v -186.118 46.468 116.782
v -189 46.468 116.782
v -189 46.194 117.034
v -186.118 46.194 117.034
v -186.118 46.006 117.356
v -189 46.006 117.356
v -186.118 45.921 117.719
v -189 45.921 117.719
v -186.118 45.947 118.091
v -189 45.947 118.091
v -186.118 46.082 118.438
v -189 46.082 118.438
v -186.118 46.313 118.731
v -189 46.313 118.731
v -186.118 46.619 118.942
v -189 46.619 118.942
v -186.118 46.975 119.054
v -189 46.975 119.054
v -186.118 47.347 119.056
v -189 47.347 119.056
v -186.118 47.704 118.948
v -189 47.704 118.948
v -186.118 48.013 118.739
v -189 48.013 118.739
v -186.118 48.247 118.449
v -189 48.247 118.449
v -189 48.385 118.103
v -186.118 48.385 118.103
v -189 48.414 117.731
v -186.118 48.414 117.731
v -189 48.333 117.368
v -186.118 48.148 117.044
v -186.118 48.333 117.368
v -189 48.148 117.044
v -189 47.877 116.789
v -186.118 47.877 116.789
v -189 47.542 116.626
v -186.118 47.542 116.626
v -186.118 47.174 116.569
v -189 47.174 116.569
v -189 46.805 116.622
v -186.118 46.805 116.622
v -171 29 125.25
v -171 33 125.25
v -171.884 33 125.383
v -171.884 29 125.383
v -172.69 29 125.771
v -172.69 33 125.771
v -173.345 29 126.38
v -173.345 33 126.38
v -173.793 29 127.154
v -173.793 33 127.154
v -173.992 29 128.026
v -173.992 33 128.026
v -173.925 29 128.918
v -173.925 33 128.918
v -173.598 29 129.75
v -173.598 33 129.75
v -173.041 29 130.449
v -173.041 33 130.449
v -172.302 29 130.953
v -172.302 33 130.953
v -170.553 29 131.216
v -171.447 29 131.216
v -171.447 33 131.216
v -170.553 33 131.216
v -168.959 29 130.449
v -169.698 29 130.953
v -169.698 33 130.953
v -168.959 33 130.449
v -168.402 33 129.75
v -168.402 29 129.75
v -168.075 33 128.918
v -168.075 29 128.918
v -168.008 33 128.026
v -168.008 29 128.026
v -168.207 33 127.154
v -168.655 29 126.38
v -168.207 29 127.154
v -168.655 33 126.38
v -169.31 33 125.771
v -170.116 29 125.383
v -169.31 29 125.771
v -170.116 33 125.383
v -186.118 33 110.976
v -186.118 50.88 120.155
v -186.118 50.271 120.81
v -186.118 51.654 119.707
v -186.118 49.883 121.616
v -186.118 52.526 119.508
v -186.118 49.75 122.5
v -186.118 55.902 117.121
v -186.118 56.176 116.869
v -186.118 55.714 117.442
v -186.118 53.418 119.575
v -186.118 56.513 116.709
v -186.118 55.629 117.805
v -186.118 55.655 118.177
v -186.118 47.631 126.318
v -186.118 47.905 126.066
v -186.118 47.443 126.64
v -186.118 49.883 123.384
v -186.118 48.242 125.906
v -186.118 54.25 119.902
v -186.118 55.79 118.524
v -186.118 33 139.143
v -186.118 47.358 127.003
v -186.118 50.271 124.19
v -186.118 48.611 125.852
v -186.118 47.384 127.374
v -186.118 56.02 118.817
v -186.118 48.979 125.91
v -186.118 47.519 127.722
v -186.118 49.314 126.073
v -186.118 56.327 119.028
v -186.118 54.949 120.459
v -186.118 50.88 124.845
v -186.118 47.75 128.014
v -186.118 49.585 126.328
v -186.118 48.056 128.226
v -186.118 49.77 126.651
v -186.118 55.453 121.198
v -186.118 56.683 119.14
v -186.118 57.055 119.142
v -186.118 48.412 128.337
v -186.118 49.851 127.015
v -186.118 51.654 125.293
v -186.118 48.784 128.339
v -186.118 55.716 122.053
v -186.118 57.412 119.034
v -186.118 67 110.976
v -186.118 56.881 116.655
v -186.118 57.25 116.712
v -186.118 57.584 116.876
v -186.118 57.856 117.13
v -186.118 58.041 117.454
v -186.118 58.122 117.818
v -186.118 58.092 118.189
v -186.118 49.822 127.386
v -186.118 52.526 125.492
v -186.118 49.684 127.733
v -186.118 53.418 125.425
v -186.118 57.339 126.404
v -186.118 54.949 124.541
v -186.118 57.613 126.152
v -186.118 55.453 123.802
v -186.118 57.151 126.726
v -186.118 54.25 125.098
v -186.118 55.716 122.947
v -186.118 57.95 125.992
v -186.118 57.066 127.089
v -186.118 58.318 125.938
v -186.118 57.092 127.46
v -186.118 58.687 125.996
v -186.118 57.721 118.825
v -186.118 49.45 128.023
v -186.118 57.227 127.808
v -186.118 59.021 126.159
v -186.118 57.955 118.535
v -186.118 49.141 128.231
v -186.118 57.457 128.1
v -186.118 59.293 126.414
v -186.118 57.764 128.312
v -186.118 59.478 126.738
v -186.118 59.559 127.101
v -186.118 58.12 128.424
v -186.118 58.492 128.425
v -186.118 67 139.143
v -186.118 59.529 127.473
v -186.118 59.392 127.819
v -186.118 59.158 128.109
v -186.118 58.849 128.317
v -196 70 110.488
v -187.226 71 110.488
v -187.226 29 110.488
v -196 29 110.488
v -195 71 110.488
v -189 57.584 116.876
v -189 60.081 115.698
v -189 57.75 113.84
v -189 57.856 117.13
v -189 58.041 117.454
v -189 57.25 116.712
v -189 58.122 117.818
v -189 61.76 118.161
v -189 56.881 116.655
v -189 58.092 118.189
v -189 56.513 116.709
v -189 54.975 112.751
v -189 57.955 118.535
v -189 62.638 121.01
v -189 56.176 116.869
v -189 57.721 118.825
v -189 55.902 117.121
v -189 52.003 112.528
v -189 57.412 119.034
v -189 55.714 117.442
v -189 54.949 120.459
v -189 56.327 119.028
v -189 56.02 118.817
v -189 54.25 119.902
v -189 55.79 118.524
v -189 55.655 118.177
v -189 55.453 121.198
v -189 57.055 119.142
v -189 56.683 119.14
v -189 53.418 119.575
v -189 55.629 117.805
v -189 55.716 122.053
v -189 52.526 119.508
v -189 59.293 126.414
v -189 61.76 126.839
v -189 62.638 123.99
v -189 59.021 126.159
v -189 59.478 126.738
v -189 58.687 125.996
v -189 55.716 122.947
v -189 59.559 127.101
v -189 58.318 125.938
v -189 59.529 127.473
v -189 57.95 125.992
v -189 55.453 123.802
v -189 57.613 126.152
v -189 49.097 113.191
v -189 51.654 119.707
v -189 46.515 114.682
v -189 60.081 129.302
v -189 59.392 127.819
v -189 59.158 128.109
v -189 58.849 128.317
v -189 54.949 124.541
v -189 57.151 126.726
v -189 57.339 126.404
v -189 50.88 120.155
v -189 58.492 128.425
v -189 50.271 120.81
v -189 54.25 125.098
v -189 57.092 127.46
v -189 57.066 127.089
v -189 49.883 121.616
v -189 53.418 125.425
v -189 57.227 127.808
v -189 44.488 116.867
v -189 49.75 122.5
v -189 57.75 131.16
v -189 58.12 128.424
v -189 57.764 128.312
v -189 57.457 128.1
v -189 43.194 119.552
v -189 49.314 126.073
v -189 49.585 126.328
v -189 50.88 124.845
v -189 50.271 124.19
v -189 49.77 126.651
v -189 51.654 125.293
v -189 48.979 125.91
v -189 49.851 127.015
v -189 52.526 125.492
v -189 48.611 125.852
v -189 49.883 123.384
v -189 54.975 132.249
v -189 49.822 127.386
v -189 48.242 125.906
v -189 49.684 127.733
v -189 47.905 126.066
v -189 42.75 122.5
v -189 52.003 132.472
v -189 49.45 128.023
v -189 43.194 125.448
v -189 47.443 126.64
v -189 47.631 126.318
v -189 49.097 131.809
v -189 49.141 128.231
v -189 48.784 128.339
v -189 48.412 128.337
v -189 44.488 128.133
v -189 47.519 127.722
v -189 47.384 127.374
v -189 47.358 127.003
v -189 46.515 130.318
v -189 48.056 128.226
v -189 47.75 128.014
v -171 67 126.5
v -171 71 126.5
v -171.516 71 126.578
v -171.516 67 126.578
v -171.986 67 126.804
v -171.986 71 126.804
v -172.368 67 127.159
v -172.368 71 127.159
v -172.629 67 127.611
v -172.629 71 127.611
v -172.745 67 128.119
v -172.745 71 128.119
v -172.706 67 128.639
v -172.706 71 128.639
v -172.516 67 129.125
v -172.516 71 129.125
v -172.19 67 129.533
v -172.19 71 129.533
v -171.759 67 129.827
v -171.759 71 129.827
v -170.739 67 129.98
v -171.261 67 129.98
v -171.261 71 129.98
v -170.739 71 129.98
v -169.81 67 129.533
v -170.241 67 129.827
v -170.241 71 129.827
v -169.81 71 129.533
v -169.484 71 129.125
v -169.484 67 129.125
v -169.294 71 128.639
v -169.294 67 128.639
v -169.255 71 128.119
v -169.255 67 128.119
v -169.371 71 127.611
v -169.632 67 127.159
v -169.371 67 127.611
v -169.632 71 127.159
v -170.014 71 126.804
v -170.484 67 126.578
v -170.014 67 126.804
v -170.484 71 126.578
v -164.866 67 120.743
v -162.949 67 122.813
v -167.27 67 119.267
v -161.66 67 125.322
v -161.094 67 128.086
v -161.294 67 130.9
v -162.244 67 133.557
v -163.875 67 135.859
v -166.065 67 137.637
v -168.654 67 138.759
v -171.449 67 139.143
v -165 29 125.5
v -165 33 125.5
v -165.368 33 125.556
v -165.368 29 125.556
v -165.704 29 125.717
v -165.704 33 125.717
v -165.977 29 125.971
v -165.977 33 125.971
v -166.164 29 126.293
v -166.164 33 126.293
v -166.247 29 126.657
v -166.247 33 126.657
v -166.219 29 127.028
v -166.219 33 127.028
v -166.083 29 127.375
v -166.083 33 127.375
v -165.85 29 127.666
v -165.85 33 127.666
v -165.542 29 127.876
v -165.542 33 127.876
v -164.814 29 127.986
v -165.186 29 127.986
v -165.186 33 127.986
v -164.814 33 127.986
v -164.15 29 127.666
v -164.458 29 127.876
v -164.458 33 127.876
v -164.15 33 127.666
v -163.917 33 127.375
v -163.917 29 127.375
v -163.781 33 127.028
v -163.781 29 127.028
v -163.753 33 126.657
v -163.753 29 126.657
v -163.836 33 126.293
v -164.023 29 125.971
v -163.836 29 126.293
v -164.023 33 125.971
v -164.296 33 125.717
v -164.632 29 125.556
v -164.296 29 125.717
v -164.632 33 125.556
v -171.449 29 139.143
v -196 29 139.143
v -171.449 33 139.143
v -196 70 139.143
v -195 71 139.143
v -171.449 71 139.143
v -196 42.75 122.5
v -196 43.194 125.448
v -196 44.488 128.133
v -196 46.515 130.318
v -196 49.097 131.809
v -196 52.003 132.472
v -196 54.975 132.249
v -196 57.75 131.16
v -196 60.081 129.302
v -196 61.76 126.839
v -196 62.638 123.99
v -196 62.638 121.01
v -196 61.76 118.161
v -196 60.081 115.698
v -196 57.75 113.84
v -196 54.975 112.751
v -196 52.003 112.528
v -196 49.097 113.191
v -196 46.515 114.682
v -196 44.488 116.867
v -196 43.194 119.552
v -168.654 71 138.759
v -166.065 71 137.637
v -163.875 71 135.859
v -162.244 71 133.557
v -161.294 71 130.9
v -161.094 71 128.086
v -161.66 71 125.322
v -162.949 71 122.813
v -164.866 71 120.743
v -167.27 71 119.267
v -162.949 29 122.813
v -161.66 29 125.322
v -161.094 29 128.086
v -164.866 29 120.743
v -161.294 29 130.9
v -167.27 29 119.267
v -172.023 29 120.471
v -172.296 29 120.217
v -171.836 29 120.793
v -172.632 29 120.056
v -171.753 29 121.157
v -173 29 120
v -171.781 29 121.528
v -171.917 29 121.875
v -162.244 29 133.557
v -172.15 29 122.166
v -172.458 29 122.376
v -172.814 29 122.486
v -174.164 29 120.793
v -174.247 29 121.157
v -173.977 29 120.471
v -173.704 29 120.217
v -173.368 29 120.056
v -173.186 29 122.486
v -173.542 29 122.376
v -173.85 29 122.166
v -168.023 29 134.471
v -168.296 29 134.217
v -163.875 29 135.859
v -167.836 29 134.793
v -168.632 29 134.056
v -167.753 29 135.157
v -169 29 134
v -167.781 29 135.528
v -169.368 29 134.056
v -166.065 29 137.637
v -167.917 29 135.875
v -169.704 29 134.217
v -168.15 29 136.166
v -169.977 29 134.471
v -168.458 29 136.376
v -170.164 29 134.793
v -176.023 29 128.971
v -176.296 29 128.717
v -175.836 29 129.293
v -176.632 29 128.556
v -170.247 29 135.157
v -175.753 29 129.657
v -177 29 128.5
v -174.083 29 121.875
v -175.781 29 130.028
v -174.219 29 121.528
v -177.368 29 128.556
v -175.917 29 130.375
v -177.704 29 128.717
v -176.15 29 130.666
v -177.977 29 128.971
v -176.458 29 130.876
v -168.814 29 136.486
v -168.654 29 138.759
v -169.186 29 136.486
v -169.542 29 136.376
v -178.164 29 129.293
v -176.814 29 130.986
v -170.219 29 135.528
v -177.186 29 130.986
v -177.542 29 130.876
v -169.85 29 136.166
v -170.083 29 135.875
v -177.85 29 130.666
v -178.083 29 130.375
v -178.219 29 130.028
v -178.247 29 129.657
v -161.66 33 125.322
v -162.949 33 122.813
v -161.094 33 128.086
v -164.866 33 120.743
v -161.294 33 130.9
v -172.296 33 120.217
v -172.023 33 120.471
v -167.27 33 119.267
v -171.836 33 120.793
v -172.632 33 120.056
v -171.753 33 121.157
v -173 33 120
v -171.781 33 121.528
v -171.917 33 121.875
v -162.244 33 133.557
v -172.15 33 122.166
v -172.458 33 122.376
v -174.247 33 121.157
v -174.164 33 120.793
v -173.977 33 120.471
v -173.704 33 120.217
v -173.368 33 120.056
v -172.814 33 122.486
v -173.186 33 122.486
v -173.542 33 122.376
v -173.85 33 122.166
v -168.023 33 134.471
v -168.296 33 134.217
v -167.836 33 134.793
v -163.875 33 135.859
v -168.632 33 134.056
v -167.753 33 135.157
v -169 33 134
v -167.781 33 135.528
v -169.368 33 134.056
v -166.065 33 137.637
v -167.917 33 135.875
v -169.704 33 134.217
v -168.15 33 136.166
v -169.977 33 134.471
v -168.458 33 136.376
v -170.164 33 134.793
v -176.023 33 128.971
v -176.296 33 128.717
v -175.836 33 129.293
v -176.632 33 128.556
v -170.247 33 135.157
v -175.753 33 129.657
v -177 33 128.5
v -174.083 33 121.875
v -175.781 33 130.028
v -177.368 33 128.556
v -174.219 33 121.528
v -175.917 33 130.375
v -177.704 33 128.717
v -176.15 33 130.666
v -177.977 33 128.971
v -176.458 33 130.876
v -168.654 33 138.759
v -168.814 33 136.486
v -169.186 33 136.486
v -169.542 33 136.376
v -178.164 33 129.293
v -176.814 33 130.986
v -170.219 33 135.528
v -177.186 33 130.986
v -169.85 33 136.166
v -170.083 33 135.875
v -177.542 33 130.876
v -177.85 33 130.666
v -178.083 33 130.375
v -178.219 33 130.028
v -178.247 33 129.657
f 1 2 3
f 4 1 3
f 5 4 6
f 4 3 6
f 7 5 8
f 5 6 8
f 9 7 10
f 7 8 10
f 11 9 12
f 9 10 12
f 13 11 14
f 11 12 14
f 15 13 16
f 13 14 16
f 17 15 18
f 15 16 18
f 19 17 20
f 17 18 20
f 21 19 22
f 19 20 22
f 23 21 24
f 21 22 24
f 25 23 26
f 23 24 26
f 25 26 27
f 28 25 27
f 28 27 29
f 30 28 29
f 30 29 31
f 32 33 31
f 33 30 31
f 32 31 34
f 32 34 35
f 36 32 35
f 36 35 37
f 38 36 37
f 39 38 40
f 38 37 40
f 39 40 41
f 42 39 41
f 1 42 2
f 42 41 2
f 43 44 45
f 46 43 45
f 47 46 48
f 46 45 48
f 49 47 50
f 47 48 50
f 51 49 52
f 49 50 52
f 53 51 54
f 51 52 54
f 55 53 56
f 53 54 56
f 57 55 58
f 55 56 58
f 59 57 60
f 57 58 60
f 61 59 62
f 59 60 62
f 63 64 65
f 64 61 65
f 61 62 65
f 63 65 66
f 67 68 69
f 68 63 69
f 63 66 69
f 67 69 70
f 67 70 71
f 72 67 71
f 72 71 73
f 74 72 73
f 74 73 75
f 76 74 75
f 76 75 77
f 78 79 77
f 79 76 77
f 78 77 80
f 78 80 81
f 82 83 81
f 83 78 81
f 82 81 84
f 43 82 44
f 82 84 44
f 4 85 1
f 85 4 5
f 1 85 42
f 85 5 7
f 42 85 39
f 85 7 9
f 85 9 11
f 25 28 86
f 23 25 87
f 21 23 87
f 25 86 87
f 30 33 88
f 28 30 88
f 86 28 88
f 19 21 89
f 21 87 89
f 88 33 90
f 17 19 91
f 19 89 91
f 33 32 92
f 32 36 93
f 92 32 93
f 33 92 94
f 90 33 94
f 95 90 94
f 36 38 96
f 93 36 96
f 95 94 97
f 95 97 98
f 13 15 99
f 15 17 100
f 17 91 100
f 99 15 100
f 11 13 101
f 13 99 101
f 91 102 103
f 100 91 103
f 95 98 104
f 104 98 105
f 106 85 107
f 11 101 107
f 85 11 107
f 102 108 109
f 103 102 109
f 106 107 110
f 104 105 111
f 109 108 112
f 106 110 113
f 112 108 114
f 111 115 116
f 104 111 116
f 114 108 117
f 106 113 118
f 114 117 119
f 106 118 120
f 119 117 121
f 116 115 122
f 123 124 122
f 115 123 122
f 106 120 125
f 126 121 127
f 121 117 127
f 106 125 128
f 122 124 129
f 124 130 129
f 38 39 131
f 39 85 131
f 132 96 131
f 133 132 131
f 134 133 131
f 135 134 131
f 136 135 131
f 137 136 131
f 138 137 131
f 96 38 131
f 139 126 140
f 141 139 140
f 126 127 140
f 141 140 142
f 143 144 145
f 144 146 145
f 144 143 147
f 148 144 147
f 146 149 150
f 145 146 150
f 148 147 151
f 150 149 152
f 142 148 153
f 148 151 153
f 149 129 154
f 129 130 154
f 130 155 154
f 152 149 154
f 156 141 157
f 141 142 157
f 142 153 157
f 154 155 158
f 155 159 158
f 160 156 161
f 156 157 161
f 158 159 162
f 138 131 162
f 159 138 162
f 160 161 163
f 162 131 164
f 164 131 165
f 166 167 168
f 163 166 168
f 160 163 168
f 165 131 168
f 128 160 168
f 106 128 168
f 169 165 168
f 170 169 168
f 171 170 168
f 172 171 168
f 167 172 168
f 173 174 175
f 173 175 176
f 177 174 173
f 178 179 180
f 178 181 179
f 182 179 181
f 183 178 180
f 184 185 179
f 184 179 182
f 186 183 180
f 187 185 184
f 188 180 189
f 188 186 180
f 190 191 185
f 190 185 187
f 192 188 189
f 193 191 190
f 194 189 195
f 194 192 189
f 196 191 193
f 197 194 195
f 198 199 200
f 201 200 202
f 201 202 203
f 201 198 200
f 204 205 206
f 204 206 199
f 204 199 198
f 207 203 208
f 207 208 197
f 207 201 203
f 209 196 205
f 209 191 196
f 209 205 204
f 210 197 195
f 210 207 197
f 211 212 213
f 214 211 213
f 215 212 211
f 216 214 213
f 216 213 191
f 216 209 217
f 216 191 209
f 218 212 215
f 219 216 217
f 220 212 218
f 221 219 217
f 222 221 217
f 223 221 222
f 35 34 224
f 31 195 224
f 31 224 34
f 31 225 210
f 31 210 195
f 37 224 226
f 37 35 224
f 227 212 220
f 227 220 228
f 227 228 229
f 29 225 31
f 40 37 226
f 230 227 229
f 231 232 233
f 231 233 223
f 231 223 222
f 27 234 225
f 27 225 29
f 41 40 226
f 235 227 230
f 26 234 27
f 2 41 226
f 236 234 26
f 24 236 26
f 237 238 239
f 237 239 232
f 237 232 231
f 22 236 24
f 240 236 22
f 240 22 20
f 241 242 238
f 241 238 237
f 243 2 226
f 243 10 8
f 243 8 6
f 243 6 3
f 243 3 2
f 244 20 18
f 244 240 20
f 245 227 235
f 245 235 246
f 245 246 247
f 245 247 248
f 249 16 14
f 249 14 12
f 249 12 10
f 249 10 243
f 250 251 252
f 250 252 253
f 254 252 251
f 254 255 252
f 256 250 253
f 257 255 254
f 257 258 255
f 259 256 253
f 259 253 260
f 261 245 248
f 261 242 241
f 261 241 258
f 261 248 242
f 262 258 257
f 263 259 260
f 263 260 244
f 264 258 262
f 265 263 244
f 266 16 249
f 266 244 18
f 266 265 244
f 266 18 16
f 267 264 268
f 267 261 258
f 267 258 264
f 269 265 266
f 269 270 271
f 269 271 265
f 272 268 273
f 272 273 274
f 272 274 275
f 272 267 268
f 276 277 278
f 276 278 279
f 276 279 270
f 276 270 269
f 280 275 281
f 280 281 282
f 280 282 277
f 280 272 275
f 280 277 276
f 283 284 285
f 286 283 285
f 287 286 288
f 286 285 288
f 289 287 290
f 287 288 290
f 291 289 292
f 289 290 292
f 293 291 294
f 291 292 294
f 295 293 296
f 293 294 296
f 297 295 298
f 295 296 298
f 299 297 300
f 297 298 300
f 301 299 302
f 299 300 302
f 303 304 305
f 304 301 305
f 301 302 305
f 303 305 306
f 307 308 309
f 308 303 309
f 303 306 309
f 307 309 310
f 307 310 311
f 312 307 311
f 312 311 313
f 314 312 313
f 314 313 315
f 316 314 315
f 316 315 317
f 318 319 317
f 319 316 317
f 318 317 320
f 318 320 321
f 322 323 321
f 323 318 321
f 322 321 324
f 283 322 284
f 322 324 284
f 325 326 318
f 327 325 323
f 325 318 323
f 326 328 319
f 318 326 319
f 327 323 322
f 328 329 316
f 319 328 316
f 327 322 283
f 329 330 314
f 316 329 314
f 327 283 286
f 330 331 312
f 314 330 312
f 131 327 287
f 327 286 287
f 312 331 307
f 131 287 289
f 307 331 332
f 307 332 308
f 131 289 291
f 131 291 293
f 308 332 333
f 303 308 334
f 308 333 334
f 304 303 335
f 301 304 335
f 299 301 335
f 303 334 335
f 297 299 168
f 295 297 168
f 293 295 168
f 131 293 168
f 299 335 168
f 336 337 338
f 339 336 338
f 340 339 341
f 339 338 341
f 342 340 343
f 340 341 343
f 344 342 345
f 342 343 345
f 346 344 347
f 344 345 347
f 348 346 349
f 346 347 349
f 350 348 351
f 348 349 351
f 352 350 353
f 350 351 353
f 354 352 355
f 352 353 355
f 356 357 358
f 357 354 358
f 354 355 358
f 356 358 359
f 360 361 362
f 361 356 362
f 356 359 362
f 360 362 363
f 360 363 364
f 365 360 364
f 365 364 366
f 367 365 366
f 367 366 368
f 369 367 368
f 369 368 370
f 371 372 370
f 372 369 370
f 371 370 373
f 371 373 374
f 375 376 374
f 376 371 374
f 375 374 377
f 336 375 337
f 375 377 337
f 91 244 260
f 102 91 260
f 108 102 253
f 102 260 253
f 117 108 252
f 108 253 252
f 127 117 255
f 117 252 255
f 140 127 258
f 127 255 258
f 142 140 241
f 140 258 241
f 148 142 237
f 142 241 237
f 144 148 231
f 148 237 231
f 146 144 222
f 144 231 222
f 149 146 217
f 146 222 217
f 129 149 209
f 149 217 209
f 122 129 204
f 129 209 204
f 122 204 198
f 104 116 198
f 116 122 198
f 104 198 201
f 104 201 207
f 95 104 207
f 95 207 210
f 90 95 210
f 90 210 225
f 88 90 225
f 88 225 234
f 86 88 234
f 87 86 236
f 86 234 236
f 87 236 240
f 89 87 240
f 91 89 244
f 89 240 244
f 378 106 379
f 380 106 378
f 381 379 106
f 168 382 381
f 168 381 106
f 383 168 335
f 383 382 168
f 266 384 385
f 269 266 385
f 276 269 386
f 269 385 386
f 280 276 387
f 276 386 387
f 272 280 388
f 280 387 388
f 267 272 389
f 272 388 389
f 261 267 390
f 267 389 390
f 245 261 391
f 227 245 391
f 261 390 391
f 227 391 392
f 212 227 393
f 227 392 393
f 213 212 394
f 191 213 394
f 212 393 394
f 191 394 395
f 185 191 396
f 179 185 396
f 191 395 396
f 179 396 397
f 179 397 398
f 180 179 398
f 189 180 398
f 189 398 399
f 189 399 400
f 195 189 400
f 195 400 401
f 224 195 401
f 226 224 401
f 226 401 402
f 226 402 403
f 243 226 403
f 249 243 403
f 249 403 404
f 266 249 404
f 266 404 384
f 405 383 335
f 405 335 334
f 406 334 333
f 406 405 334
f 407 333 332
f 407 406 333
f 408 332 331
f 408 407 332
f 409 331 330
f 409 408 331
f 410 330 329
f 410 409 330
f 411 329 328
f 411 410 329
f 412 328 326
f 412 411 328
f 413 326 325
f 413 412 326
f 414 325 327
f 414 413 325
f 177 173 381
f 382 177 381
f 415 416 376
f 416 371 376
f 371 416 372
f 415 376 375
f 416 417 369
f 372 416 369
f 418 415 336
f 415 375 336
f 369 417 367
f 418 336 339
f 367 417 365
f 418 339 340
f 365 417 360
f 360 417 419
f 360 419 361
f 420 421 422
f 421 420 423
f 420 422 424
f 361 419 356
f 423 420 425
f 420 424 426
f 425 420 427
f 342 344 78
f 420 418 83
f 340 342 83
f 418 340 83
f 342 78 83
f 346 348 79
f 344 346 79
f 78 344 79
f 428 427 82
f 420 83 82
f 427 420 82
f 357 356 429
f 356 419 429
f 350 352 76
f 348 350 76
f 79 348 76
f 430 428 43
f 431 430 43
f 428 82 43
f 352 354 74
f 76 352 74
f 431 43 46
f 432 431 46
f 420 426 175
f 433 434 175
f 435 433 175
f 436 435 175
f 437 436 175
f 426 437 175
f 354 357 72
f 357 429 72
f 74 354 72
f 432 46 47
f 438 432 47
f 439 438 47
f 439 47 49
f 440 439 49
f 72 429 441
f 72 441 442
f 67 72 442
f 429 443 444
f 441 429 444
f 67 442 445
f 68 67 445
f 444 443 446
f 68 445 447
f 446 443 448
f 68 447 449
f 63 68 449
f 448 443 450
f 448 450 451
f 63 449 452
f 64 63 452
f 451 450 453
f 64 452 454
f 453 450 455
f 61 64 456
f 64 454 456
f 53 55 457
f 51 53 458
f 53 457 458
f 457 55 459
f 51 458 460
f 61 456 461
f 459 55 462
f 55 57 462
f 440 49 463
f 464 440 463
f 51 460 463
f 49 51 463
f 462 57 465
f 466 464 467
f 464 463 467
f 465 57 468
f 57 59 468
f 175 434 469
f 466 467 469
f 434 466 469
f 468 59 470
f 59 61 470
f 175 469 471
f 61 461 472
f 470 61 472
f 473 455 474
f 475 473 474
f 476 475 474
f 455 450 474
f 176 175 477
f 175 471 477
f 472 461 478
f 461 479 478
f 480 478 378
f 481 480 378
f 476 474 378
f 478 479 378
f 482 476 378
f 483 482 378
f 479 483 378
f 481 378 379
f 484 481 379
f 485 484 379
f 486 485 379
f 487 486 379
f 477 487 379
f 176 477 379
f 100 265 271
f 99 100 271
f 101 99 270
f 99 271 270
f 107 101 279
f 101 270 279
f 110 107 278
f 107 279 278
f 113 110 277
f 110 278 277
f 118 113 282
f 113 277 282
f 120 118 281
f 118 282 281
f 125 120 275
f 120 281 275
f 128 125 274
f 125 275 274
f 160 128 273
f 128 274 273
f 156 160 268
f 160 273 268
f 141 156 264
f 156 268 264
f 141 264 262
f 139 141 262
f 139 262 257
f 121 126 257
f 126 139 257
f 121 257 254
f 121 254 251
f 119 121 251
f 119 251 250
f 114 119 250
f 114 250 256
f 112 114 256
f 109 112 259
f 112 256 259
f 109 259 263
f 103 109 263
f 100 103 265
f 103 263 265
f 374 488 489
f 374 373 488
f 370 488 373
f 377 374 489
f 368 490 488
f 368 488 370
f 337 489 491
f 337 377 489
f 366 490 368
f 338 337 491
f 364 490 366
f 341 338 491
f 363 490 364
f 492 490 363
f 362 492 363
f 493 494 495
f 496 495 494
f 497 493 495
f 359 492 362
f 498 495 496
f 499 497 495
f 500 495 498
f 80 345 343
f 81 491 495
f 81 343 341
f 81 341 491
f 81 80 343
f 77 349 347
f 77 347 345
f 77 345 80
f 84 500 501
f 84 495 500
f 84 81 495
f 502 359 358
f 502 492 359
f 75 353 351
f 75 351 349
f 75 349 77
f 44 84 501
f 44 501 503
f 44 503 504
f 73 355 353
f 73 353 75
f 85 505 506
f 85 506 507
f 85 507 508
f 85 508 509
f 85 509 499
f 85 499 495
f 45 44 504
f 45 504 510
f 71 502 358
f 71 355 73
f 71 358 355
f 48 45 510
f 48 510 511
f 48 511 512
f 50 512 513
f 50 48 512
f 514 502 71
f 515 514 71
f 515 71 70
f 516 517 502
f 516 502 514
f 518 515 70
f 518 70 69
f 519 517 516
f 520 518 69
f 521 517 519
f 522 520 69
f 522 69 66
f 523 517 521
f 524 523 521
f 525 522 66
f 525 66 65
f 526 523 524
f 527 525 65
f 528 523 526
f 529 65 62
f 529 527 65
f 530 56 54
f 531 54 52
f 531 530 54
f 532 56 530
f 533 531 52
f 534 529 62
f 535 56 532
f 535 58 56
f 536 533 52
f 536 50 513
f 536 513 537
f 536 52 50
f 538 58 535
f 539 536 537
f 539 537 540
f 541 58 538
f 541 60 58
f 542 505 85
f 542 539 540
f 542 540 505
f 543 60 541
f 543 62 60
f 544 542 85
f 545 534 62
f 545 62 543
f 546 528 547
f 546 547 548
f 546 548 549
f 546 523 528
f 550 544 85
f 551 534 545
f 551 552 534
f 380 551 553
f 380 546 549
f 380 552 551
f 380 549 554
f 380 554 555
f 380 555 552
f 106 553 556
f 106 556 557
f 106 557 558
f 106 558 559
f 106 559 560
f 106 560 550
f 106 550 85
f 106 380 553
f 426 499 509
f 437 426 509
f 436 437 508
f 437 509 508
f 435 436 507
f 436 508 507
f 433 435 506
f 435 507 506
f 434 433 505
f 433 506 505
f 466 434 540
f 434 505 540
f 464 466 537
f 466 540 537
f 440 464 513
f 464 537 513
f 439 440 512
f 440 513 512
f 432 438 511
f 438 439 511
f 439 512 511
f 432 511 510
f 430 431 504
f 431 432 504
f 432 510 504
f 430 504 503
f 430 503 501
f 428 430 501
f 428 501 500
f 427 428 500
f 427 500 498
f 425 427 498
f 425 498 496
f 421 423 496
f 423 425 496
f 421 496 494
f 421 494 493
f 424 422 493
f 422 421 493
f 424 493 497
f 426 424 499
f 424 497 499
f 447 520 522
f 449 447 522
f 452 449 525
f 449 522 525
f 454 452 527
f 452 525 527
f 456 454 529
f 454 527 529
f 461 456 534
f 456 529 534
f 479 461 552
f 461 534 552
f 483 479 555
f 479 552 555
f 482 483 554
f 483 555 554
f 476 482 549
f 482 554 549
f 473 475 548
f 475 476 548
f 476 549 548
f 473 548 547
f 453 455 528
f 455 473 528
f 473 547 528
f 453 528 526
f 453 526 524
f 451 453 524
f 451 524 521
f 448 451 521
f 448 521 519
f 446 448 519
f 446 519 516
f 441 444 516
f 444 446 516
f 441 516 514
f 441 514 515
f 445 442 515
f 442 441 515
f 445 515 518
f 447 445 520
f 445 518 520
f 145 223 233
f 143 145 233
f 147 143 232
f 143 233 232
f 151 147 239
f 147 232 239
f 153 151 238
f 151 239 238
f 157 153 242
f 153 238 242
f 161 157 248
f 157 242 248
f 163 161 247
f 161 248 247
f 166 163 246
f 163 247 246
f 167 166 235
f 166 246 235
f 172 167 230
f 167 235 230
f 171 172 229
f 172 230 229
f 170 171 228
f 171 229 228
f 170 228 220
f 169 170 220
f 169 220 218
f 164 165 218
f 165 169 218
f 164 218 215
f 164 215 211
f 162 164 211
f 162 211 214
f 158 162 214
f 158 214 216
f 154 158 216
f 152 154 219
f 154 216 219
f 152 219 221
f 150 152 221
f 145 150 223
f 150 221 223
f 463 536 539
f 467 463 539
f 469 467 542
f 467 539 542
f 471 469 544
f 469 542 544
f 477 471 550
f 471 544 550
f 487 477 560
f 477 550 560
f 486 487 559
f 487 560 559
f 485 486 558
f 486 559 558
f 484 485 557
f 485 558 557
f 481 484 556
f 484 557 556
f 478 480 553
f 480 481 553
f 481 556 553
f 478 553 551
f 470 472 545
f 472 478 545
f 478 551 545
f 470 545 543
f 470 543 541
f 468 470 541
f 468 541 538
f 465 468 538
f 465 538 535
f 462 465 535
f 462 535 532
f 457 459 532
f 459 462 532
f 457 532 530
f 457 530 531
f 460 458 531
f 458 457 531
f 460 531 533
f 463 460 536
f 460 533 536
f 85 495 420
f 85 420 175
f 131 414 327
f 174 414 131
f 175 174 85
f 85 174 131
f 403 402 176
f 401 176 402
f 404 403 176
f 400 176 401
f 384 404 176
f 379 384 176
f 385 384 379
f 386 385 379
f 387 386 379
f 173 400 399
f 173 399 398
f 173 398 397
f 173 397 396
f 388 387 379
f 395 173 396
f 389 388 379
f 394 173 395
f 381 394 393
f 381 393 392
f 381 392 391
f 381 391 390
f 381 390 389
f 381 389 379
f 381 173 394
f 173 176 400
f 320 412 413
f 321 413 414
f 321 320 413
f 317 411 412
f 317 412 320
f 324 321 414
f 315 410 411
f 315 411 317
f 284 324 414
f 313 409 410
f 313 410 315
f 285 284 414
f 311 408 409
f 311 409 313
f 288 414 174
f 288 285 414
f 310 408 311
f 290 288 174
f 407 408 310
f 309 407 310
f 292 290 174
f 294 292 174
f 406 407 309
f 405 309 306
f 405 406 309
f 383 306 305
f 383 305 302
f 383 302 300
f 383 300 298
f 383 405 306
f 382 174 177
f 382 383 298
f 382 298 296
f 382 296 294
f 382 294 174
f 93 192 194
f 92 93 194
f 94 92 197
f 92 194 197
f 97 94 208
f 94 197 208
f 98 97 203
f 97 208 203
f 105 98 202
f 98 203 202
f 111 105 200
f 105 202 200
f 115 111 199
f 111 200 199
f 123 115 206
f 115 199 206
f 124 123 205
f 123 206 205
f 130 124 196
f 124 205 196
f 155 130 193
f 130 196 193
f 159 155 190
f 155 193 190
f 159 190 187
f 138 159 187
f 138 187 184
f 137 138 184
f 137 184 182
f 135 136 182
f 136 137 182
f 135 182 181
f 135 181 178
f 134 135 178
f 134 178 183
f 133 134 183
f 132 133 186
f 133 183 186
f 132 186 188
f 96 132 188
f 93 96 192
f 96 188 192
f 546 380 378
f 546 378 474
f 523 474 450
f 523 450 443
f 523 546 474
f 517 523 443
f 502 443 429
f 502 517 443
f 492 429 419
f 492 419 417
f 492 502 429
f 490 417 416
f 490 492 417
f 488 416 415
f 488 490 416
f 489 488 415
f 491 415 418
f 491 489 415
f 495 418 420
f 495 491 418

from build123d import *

# Parameters (mm, degrees)
CYLINDER067_R                        = 1.75
CYLINDER067_DEPTH                    = 22
CYLINDER067_PITCH_ANGLE              = 90
CYLINDER061_R                        = 1.25
CYLINDER061_DEPTH                    = 22
CYLINDER061_PITCH_ANGLE              = 90
CYLINDER062_R                        = 1.25
CYLINDER062_DEPTH                    = 22
CYLINDER062_PITCH_ANGLE              = 90
CYLINDER060_R                        = 1.25
CYLINDER060_DEPTH                    = 22
CYLINDER060_PITCH_ANGLE              = 90
CYLINDER059_R                        = 1.25
CYLINDER059_DEPTH                    = 22
CYLINDER059_PITCH_ANGLE              = 90
CYLINDER065_R                        = 1.25
CYLINDER065_DEPTH                    = 22
CYLINDER065_PITCH_ANGLE              = 90
CYLINDER066_R                        = 1.25
CYLINDER066_DEPTH                    = 22
CYLINDER066_PITCH_ANGLE              = 90
CYLINDER064_R                        = 1.25
CYLINDER064_DEPTH                    = 22
CYLINDER064_PITCH_ANGLE              = 90
CYLINDER063_R                        = 1.25
CYLINDER063_DEPTH                    = 22
CYLINDER063_PITCH_ANGLE              = 90
FUSION047_ROLL_ANGLE                 = 34
FUSION047_PLACEMENT_ANGLE            = -90
CYLINDER058_R                        = 3
CYLINDER058_DEPTH                    = 22
CYLINDER058_PITCH_ANGLE              = 90
CYLINDER057_R                        = 3
CYLINDER057_DEPTH                    = 13
CYLINDER057_ROLL_ANGLE               = 90
CYLINDER056_R                        = 10
CYLINDER056_DEPTH                    = 10
CYLINDER056_ROLL_ANGLE               = 90
PAD007_DEPTH                         = 34
PAD005_DEPTH                         = 42
CHAMFER104_SIZE                      = 1
CLONE020_PLACEMENT_ANGLE             = -90
PART_MIRRORING007012_PLACEMENT_ANGLE = 180


with BuildPart() as cilindro011:
    # Cylinder067 → Cylinder067 (new body)
    with BuildSketch(Plane.XY):
        Circle(CYLINDER067_R)
    extrude(amount=CYLINDER067_DEPTH)


with BuildPart() as cilindro011_1:
    # Cylinder067 pitch: moved
    add(cilindro011.part.rotate(Axis((0, 0, 0), (0, 1, 0)), CYLINDER067_PITCH_ANGLE))


with BuildPart() as cilindro011_2:
    # Cylinder067 placement: moved
    add(cilindro011_1.part.moved(Location((-4.75, -32, 125.75))))


with BuildPart() as cilindro005:
    # Cylinder061 → Cylinder061 (new body)
    with BuildSketch(Plane.XY):
        Circle(CYLINDER061_R)
    extrude(amount=CYLINDER061_DEPTH)


with BuildPart() as cilindro005_1:
    # Cylinder061 pitch: moved
    add(cilindro005.part.rotate(Axis((0, 0, 0), (0, 1, 0)), CYLINDER061_PITCH_ANGLE))


with BuildPart() as cilindro005_2:
    # Cylinder061 placement: moved
    add(cilindro005_1.part.moved(Location((20.25, -38, 124.25))))


with BuildPart() as cilindro006:
    # Cylinder062 → Cylinder062 (new body)
    with BuildSketch(Plane.XY):
        Circle(CYLINDER062_R)
    extrude(amount=CYLINDER062_DEPTH)


with BuildPart() as cilindro006_1:
    # Cylinder062 pitch: moved
    add(cilindro006.part.rotate(Axis((0, 0, 0), (0, 1, 0)), CYLINDER062_PITCH_ANGLE))


with BuildPart() as cilindro006_2:
    # Cylinder062 placement: moved
    add(cilindro006_1.part.moved(Location((20.25, -26, 127.25))))


with BuildPart() as cilindro004:
    # Cylinder060 → Cylinder060 (new body)
    with BuildSketch(Plane.XY):
        Circle(CYLINDER060_R)
    extrude(amount=CYLINDER060_DEPTH)


with BuildPart() as cilindro004_1:
    # Cylinder060 pitch: moved
    add(cilindro004.part.rotate(Axis((0, 0, 0), (0, 1, 0)), CYLINDER060_PITCH_ANGLE))


with BuildPart() as cilindro004_2:
    # Cylinder060 placement: moved
    add(cilindro004_1.part.moved(Location((20.25, -30, 118.75))))


with BuildPart() as fusion046:
    # Cylinder059 → Cylinder059 (new body)
    with BuildSketch(Plane.XY):
        Circle(CYLINDER059_R)
    extrude(amount=CYLINDER059_DEPTH)


with BuildPart() as fusion046_1:
    # Cylinder059 pitch: moved
    add(fusion046.part.rotate(Axis((0, 0, 0), (0, 1, 0)), CYLINDER059_PITCH_ANGLE))


with BuildPart() as fusion046_2:
    # Cylinder059 placement: moved
    add(fusion046_1.part.moved(Location((20.25, -34, 132.75))))

    # Fusion046: union Cilindro005, Cilindro006, Cilindro004
    add(cilindro005_2.part)
    add(cilindro006_2.part)
    add(cilindro004_2.part)


with BuildPart() as cilindro009:
    # Cylinder065 → Cylinder065 (new body)
    with BuildSketch(Plane.XY):
        Circle(CYLINDER065_R)
    extrude(amount=CYLINDER065_DEPTH)


with BuildPart() as cilindro009_1:
    # Cylinder065 pitch: moved
    add(cilindro009.part.rotate(Axis((0, 0, 0), (0, 1, 0)), CYLINDER065_PITCH_ANGLE))


with BuildPart() as cilindro009_2:
    # Cylinder065 placement: moved
    add(cilindro009_1.part.moved(Location((20.25, -38, 124.25))))


with BuildPart() as cilindro010:
    # Cylinder066 → Cylinder066 (new body)
    with BuildSketch(Plane.XY):
        Circle(CYLINDER066_R)
    extrude(amount=CYLINDER066_DEPTH)


with BuildPart() as cilindro010_1:
    # Cylinder066 pitch: moved
    add(cilindro010.part.rotate(Axis((0, 0, 0), (0, 1, 0)), CYLINDER066_PITCH_ANGLE))


with BuildPart() as cilindro010_2:
    # Cylinder066 placement: moved
    add(cilindro010_1.part.moved(Location((20.25, -26, 127.25))))


with BuildPart() as cilindro008:
    # Cylinder064 → Cylinder064 (new body)
    with BuildSketch(Plane.XY):
        Circle(CYLINDER064_R)
    extrude(amount=CYLINDER064_DEPTH)


with BuildPart() as cilindro008_1:
    # Cylinder064 pitch: moved
    add(cilindro008.part.rotate(Axis((0, 0, 0), (0, 1, 0)), CYLINDER064_PITCH_ANGLE))


with BuildPart() as cilindro008_2:
    # Cylinder064 placement: moved
    add(cilindro008_1.part.moved(Location((20.25, -30, 118.75))))


with BuildPart() as fusion047:
    # Cylinder063 → Cylinder063 (new body)
    with BuildSketch(Plane.XY):
        Circle(CYLINDER063_R)
    extrude(amount=CYLINDER063_DEPTH)


with BuildPart() as fusion047_1:
    # Cylinder063 pitch: moved
    add(fusion047.part.rotate(Axis((0, 0, 0), (0, 1, 0)), CYLINDER063_PITCH_ANGLE))


with BuildPart() as fusion047_2:
    # Cylinder063 placement: moved
    add(fusion047_1.part.moved(Location((20.25, -34, 132.75))))

    # Fusion047: union Cilindro009, Cilindro010, Cilindro008
    add(cilindro009_2.part)
    add(cilindro010_2.part)
    add(cilindro008_2.part)


with BuildPart() as fusion047_3:
    # Fusion047 roll: moved
    add(fusion047_2.part.rotate(Axis((0, 0, 0), (1, 0, 0)), FUSION047_ROLL_ANGLE))


with BuildPart() as fusion047_4:
    # Fusion047 placement: moved
    add(fusion047_3.part.moved(Location((114.107998, 21, 33.646227))).rotate(Axis((114.107998, 21, 33.646227), (0, 0, 1)), FUSION047_PLACEMENT_ANGLE))


with BuildPart() as cilindro002:
    # Cylinder058 → Cylinder058 (new body)
    with BuildSketch(Plane.XY):
        Circle(CYLINDER058_R)
    extrude(amount=CYLINDER058_DEPTH)


with BuildPart() as cilindro002_1:
    # Cylinder058 pitch: moved
    add(cilindro002.part.rotate(Axis((0, 0, 0), (0, 1, 0)), CYLINDER058_PITCH_ANGLE))


with BuildPart() as cilindro002_2:
    # Cylinder058 placement: moved
    add(cilindro002_1.part.moved(Location((20.25, -32, 125.75))))


with BuildPart() as cilindro001:
    # Cylinder057 → Cylinder057 (new body)
    with BuildSketch(Plane.XY):
        Circle(CYLINDER057_R)
    extrude(amount=CYLINDER057_DEPTH)


with BuildPart() as cilindro001_1:
    # Cylinder057 roll: moved
    add(cilindro001.part.rotate(Axis((0, 0, 0), (1, 0, 0)), CYLINDER057_ROLL_ANGLE))


with BuildPart() as cilindro001_2:
    # Cylinder057 placement: moved
    add(cilindro001_1.part.moved(Location((17.25, -6, 120))))


with BuildPart() as cilindro:
    # Cylinder056 → Cylinder056 (new body)
    with BuildSketch(Plane.XY):
        Circle(CYLINDER056_R)
    extrude(amount=CYLINDER056_DEPTH)


with BuildPart() as cilindro_1:
    # Cylinder056 roll: moved
    add(cilindro.part.rotate(Axis((0, 0, 0), (1, 0, 0)), CYLINDER056_ROLL_ANGLE))


with BuildPart() as cilindro_2:
    # Cylinder056 placement: moved
    add(cilindro_1.part.moved(Location((17.25, -4, 120))))


with BuildPart() as pad007:
    # Sketch012 → Pad007 (new body)
    with BuildSketch(Plane(origin=(3, -12, -1), x_dir=(0, 1, 0), z_dir=(1, 0, 0))):
        Polygon((-4.882067, 101.940956), (-4.882067, 138.559921), (-40.571098, 142.373672), (-40.571098, 120.688431), align=None)
    extrude(amount=PAD007_DEPTH)


with BuildPart() as right_shoulder:
    # Sketch010 → Pad005 (new body)
    with BuildSketch(Plane.YZ.offset(-1)):
        with BuildLine():
            Line((-35.729516, 116.76657), (-15.773906, 107.988197))
            Line((-15.773906, 107.988197), (-7.000344, 107.988197))
            Line((-7.000344, 107.988197), (-7.000344, 136.642965))
            Line((-7.000344, 136.642965), (-31.550963, 136.642965))
            ThreePointArc((-31.550963, 136.642965), (-41.706398, 128.400491), (-35.729516, 116.76657))
        make_face()
    extrude(amount=PAD005_DEPTH)

    # Cut085: cut Pad007
    add(pad007.part, mode=Mode.SUBTRACT)

    # Cut086: cut Cilindro
    add(cilindro_2.part, mode=Mode.SUBTRACT)

    # Cut087: cut Cilindro001
    add(cilindro001_2.part, mode=Mode.SUBTRACT)

    # Chamfer104
    chamfer104_edges = [right_shoulder.edges().sort_by_distance(p)[0] for p in [
        (-1, -7.000344, 122.315581),
    ]]
    chamfer(chamfer104_edges, length=CHAMFER104_SIZE)

    # Cut088: cut Cilindro002
    add(cilindro002_2.part, mode=Mode.SUBTRACT)

    # Cut089: cut Fusion047
    add(fusion047_4.part, mode=Mode.SUBTRACT)

    # Cut090: cut Fusion046
    add(fusion046_2.part, mode=Mode.SUBTRACT)

    # Cut091: cut Cilindro011
    add(cilindro011_2.part, mode=Mode.SUBTRACT)


with BuildPart() as right_shoulder_1:
    # Clone020 placement: moved
    add(right_shoulder.part.moved(Location((-275, 70, 2.5))).rotate(Axis((-275, 70, 2.5), (0, 0, 1)), CLONE020_PLACEMENT_ANGLE))


with BuildPart() as left_shoulder:
    # Part__Mirroring007012: instance of right-shoulder
    add(right_shoulder_1.part.mirror(Plane(origin=(0, 0, 0), x_dir=(1, 0, 0), z_dir=(0, 1, 0))))


with BuildPart() as left_shoulder_1:
    # Part__Mirroring007012 placement: moved
    add(left_shoulder.part.moved(Location((-478, 0, 0))).rotate(Axis((-478, 0, 0), (0, 0, 1)), PART_MIRRORING007012_PLACEMENT_ANGLE))


solid = left_shoulder_1.part
